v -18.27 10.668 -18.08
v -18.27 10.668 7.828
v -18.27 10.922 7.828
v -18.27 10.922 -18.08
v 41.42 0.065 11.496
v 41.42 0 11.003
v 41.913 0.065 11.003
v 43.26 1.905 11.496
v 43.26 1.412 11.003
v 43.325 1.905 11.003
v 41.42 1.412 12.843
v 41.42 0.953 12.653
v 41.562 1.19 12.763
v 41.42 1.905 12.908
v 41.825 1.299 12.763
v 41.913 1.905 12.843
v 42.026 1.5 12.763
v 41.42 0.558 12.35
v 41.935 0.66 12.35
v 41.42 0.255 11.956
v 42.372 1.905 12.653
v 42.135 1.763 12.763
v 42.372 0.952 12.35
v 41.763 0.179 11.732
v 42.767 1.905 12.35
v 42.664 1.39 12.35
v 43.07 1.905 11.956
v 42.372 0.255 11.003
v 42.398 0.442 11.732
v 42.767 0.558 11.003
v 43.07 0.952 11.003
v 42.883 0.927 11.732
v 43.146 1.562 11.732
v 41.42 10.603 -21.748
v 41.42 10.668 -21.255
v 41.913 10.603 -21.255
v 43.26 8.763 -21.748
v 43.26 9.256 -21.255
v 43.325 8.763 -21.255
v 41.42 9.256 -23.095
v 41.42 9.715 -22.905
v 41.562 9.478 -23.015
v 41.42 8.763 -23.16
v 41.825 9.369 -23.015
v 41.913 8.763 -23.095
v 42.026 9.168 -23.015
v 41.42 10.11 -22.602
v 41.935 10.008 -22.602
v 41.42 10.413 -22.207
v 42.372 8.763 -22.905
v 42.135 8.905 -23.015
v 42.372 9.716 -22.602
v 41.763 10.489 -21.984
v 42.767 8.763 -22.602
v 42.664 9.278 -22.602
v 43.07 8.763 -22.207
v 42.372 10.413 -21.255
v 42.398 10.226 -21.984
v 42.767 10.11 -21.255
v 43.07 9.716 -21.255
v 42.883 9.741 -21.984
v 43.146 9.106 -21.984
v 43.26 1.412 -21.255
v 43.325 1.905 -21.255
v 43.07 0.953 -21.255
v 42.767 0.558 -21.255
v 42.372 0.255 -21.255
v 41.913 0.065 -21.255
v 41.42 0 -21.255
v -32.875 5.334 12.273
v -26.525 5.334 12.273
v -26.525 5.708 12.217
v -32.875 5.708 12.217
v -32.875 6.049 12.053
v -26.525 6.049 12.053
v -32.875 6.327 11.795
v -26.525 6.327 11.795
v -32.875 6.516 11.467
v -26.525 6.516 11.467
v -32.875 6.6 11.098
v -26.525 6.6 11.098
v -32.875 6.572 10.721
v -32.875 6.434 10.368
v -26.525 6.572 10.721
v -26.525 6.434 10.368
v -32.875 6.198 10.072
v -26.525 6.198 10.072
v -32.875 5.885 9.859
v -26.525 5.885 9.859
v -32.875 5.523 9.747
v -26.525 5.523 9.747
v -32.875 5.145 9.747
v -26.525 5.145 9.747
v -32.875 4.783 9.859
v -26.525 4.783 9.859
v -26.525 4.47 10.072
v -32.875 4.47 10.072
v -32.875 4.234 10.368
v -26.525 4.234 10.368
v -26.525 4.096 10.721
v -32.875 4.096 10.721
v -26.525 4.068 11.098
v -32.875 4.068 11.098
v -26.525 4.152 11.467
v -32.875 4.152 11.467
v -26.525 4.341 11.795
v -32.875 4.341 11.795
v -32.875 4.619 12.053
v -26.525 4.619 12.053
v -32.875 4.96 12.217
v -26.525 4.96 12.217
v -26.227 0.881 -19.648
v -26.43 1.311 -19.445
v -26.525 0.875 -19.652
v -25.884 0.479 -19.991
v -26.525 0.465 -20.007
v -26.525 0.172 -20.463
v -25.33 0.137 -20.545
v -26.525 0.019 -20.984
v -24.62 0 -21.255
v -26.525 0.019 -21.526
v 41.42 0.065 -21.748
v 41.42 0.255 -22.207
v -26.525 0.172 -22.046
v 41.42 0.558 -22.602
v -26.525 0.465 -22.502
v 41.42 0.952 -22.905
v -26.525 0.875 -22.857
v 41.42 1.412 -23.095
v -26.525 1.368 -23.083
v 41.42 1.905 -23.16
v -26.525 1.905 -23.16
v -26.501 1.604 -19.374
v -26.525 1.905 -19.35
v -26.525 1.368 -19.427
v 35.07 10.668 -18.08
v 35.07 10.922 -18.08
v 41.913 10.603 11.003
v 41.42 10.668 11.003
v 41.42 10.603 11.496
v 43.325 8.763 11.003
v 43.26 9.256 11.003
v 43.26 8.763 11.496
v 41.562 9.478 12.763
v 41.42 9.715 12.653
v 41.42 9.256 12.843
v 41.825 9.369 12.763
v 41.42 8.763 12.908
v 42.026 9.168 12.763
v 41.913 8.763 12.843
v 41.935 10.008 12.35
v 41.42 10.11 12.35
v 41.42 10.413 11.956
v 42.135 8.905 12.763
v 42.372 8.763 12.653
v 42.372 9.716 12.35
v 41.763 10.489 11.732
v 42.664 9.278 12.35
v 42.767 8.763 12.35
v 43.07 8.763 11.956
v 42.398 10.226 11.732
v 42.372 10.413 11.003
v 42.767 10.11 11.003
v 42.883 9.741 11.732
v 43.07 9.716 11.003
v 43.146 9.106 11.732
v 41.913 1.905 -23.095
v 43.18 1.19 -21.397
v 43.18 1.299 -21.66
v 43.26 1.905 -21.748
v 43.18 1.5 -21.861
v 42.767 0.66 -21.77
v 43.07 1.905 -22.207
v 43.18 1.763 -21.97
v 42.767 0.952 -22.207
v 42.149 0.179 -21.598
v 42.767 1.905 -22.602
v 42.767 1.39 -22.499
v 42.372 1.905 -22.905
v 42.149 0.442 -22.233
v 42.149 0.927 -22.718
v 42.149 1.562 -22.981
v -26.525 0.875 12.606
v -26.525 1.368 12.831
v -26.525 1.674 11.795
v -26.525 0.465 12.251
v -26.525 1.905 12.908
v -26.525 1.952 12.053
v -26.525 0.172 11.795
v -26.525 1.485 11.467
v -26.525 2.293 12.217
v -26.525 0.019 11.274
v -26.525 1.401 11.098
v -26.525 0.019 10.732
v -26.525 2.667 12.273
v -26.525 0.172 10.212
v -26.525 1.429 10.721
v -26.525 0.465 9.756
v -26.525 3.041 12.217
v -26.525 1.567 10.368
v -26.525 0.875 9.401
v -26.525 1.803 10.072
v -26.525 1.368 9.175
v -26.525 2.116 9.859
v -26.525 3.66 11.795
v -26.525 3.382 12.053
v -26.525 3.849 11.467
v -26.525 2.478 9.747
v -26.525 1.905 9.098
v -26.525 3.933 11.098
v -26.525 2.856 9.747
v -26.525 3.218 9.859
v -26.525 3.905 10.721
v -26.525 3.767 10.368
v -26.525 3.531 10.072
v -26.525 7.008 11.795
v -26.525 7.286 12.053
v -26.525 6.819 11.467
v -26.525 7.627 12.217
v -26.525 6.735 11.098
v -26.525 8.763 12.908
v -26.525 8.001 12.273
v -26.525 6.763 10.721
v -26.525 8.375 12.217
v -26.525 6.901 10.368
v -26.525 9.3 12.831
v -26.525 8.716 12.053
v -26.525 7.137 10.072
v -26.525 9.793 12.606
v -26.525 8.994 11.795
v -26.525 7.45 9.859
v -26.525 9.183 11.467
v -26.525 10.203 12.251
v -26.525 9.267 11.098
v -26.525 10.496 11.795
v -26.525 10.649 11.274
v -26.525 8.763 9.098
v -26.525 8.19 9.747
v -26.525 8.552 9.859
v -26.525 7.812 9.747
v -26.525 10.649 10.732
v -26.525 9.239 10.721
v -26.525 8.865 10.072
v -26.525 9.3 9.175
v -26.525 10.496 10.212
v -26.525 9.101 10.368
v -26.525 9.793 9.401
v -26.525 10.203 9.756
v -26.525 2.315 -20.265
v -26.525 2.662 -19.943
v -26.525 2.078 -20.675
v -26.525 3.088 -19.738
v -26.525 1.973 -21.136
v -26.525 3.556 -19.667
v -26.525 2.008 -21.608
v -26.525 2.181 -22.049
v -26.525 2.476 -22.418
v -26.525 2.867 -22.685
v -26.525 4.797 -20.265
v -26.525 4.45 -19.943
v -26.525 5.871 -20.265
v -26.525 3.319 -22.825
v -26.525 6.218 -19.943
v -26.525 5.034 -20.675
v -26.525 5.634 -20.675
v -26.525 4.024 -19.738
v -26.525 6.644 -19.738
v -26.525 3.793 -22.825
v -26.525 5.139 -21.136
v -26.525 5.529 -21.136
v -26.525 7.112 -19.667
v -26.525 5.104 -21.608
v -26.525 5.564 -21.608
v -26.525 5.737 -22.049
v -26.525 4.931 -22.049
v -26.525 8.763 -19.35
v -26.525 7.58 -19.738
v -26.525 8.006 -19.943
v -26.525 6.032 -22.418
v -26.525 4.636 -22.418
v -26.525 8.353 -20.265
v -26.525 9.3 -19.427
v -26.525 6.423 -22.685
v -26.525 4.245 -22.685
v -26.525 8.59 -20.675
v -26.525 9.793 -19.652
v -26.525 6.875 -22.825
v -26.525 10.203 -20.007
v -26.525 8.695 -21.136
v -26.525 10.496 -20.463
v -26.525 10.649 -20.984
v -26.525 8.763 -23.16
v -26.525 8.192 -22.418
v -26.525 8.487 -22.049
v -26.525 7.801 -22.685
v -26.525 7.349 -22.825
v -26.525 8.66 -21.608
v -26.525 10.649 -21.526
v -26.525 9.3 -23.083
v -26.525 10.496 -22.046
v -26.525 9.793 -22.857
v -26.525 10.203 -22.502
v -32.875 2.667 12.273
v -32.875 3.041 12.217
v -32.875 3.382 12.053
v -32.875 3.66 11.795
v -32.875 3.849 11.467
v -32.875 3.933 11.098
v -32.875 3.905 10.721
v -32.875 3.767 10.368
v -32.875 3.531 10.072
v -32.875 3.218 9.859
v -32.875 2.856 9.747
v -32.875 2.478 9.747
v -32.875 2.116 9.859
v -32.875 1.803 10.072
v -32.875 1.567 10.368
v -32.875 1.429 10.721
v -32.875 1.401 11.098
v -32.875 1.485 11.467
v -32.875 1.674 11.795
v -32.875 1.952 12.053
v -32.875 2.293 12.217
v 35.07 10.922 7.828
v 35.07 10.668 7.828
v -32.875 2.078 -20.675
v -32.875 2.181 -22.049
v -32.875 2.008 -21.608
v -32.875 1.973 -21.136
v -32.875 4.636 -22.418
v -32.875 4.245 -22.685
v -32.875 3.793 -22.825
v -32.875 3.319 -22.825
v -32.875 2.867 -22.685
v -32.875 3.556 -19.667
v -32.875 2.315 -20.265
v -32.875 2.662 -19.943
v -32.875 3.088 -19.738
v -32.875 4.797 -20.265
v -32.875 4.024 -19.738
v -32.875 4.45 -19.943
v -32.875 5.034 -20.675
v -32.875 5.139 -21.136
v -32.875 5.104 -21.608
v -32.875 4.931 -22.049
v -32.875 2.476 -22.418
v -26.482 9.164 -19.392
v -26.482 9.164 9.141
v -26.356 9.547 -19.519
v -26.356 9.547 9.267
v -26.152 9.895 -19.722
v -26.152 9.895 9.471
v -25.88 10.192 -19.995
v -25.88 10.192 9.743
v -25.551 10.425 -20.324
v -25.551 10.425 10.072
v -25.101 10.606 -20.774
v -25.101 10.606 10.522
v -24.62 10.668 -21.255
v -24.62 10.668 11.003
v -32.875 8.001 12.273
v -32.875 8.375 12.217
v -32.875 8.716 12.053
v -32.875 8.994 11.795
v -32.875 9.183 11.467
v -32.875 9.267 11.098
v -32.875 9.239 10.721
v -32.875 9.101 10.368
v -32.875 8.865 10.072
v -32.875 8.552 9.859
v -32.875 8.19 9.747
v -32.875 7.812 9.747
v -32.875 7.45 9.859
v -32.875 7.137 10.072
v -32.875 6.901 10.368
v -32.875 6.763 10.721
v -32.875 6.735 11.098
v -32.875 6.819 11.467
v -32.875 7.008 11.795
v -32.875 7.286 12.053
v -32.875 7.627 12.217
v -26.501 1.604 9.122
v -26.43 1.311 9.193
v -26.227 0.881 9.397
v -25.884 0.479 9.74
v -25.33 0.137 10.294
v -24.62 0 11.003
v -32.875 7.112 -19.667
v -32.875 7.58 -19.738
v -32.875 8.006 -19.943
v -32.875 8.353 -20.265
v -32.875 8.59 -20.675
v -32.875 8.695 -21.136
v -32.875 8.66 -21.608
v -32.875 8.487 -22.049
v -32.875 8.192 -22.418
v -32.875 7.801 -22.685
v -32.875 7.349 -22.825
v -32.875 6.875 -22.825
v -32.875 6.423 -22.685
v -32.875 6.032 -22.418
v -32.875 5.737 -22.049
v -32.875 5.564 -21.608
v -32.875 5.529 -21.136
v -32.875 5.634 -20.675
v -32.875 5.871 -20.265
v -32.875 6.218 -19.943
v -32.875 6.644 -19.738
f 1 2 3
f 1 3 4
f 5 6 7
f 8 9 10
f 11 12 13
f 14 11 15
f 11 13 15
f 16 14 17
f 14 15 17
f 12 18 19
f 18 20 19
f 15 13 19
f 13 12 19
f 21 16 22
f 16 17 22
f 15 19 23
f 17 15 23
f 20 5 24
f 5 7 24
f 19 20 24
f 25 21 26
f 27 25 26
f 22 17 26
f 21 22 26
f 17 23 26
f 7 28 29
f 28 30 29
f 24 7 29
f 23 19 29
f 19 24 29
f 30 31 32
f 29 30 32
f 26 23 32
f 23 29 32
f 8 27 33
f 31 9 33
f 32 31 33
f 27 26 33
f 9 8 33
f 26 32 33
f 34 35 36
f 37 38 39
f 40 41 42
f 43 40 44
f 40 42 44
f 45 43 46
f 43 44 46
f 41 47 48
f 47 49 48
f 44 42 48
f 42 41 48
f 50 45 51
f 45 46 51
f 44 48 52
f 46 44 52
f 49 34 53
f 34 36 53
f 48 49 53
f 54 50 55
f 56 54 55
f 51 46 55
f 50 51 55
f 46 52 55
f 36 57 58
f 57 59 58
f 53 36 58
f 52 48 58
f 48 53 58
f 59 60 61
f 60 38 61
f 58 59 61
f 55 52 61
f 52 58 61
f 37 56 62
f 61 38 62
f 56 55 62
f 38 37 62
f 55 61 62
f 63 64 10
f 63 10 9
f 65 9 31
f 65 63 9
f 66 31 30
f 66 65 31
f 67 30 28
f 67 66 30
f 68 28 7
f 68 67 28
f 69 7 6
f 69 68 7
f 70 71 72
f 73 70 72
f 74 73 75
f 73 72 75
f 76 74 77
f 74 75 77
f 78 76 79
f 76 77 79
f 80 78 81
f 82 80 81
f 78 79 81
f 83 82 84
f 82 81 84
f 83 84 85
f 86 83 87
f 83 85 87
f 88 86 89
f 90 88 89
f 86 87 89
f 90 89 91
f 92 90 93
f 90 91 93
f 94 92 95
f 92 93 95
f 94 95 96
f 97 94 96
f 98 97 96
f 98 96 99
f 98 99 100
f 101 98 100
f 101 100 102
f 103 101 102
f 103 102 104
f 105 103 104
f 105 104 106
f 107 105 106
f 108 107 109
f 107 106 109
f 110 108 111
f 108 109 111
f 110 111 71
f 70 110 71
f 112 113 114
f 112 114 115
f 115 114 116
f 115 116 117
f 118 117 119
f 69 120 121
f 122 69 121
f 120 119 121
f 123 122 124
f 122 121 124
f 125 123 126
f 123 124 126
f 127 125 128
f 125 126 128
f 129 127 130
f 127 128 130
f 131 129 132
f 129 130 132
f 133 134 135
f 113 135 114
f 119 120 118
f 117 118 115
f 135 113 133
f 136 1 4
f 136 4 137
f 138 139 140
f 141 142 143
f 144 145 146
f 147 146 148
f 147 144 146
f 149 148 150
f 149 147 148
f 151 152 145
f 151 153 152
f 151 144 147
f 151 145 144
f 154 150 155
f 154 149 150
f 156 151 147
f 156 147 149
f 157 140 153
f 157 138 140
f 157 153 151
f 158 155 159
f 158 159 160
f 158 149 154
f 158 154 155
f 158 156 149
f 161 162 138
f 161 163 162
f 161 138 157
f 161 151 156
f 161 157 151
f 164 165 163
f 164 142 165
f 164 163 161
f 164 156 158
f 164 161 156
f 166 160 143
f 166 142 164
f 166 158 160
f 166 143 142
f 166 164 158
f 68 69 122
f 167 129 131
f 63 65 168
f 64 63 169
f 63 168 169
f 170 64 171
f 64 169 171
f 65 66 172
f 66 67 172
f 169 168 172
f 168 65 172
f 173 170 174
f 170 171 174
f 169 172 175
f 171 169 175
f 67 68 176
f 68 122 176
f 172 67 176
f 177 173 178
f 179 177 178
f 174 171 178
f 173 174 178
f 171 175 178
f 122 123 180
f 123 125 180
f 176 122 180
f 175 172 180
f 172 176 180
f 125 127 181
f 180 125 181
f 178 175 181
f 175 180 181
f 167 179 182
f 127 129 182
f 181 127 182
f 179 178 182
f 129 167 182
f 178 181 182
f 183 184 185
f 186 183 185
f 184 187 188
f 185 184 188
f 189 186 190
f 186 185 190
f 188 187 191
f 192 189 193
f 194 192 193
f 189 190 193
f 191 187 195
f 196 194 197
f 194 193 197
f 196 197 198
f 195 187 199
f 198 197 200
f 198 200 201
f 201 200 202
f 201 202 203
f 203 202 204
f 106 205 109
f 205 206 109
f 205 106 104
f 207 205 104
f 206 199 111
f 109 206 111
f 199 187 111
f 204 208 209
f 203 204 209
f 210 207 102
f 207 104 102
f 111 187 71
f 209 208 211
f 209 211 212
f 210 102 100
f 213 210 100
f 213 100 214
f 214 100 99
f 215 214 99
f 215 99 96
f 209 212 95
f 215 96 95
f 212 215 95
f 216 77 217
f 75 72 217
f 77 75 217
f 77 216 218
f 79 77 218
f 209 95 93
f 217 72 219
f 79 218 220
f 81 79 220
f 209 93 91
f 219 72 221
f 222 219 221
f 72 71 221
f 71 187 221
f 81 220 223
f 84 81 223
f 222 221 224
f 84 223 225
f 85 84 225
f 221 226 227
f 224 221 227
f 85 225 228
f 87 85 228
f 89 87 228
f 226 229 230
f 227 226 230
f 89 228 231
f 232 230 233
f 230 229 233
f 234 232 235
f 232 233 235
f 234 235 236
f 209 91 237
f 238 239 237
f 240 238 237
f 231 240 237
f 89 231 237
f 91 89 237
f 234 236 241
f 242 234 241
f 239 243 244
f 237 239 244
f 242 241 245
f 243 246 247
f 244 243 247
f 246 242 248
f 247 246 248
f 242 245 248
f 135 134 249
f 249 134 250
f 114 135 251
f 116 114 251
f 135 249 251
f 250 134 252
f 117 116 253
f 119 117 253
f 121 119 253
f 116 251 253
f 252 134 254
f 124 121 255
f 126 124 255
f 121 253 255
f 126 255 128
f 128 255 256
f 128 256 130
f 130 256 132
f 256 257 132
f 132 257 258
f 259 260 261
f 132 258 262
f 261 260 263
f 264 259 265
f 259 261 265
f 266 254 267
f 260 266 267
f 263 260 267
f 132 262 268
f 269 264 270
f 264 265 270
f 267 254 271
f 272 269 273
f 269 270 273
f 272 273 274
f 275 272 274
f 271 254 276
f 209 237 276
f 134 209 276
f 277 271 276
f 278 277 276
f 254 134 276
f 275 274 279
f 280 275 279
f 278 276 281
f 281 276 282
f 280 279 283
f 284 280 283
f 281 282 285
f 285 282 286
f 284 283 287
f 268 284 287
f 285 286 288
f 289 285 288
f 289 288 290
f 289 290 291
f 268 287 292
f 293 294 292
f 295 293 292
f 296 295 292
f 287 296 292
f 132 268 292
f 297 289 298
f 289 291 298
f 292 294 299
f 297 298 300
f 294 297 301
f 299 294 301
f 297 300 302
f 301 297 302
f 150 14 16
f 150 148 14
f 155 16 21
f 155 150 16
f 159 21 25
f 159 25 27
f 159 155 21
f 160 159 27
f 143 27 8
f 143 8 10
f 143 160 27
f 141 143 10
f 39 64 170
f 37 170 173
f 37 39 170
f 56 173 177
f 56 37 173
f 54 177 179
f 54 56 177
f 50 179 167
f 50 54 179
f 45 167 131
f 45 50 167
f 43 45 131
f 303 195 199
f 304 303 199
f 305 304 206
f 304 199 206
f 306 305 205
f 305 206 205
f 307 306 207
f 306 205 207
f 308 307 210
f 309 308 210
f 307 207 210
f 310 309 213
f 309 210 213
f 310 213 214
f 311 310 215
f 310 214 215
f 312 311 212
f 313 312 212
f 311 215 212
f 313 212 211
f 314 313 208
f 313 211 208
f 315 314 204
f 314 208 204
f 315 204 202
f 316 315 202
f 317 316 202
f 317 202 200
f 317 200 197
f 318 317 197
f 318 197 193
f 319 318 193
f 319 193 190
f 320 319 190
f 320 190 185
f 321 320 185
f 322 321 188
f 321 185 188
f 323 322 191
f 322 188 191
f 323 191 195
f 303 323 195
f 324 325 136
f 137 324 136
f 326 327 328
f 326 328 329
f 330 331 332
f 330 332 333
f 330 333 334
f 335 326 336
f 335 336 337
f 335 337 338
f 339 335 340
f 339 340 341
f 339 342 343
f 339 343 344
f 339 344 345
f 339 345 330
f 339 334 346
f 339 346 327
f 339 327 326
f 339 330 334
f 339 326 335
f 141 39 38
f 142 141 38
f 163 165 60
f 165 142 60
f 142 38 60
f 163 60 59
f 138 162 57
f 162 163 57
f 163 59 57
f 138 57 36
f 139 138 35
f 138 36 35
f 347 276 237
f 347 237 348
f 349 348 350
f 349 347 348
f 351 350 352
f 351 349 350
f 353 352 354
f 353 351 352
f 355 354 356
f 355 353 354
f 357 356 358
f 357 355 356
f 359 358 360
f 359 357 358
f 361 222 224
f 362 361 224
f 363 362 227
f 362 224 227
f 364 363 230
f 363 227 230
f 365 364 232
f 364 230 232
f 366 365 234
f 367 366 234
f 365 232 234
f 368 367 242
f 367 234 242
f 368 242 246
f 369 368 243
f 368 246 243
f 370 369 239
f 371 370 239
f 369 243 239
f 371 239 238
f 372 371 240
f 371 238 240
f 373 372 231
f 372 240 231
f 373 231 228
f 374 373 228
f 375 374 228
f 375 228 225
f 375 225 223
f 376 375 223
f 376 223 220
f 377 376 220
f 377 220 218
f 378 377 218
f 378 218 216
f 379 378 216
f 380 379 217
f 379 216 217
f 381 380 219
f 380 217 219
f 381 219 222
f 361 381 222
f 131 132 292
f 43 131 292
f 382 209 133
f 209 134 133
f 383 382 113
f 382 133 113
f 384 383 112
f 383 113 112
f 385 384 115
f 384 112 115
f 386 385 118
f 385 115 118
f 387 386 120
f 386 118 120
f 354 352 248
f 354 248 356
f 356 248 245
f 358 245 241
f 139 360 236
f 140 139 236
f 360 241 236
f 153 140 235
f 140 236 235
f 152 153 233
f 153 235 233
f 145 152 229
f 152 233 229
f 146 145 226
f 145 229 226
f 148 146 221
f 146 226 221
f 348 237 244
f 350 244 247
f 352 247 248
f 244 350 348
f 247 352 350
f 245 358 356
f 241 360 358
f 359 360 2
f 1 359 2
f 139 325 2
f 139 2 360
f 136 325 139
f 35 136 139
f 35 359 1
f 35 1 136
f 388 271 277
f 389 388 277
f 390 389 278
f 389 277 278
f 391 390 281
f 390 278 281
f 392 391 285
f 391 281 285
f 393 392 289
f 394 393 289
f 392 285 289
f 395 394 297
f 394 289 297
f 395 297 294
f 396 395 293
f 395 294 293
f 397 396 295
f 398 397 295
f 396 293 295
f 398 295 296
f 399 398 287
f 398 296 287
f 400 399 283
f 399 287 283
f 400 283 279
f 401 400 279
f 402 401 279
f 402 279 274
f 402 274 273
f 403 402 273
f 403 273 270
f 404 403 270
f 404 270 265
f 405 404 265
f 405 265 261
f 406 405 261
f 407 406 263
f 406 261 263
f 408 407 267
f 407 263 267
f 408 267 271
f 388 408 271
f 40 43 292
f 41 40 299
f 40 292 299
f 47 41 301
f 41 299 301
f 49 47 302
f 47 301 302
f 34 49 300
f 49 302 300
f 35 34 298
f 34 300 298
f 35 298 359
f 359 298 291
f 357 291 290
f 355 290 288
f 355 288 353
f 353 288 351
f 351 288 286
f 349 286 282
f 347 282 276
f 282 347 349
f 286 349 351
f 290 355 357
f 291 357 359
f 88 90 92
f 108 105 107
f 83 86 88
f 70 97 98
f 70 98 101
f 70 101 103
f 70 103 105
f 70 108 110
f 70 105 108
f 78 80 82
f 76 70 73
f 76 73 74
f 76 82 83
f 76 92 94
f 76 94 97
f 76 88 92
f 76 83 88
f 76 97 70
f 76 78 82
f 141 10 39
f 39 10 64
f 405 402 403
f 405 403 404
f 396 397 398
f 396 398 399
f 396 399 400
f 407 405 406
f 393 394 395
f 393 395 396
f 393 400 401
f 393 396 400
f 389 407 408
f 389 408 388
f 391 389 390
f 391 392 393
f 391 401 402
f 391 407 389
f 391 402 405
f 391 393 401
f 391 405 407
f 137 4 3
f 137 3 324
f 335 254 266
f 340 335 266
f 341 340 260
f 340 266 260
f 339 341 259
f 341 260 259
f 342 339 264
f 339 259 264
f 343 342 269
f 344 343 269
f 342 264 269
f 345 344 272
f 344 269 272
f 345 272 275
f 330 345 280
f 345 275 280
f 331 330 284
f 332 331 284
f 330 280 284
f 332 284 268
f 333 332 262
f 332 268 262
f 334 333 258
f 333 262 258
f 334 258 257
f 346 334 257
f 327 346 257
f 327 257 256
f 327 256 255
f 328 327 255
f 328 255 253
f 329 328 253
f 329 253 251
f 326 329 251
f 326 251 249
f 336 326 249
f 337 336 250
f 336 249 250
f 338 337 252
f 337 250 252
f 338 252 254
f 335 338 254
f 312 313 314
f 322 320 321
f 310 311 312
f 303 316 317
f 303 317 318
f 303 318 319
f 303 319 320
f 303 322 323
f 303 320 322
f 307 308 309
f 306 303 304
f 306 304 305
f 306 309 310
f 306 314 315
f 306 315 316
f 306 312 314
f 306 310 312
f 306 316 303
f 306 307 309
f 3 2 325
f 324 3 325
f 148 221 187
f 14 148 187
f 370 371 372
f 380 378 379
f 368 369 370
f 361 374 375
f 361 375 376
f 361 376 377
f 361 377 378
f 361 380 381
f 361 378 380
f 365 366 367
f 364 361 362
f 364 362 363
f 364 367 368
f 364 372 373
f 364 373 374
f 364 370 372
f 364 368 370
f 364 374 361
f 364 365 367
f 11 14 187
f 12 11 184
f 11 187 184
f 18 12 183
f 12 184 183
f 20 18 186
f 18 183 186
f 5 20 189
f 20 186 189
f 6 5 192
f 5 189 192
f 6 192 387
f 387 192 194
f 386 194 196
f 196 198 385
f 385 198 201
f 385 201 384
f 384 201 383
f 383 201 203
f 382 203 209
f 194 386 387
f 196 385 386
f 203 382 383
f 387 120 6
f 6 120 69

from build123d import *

# Parameters (mm, degrees)
SKETCH1_W       = 69.85
SKETCH1_H       = 36.068
BATTERY_DEPTH   = 10.668
FILLET_2_R      = 1.905
WIRE_BOSS_DEPTH = 5.08
SKETCH3_R       = 1.27
SKETCH3_R_2     = 1.5875
WIRES_2_DEPTH   = 6.35
SKETCH4_W       = 53.34
SKETCH4_H       = 25.908
LABEL_DEPTH     = 0.254


with BuildPart() as part:
    # Sketch1 → Battery (new body)
    with BuildSketch(Plane(origin=(0, 0, 0), x_dir=(1, 0, 0), z_dir=(0, 1, 0))):
        with Locations((8.399917755, 5.125761329)):
            Rectangle(SKETCH1_W, SKETCH1_H)
    extrude(amount=BATTERY_DEPTH)

    # Fillet 2
    fillet_2_edges = [part.edges().sort_by_distance(p)[0] for p in [
        (43.324917755, 10.668, -5.125761329),
        (8.399917755, 10.668, -23.159761329),
        (-26.525082245, 10.668, -5.125761329),
        (8.399917755, 0, -23.159761329),
        (43.324917755, 0, -5.125761329),
        (8.399917755, 0, 12.908238671),
        (-26.525082245, 0, -5.125761329),
        (8.399917755, 10.668, 12.908238671),
        (-26.525082245, 5.334, -23.159761329),
        (43.324917755, 5.334, -23.159761329),
        (43.324917755, 5.334, 12.908238671),
        (-26.525082245, 5.334, 12.908238671),
    ]]
    fillet(fillet_2_edges, radius=FILLET_2_R)

    # Sketch2 → Wire Boss (add)
    with BuildSketch(Plane.ZY.offset(26.525082245)):
        with BuildLine():
            Line((12.908238671, 8.763), (12.908238671, 1.905))
            ThreePointArc((12.908238671, 1.905), (11.003238671, 0), (9.098238671, 1.905))
            Line((9.098238671, 1.905), (9.098238671, 8.763))
            ThreePointArc((9.098238671, 8.763), (11.003238671, 10.668), (12.908238671, 8.763))
        make_face()
        with BuildLine():
            Line((-19.349761329, 8.763), (-19.349761329, 1.905))
            ThreePointArc((-19.349761329, 1.905), (-21.254761329, 0), (-23.159761329, 1.905))
            Line((-23.159761329, 1.905), (-23.159761329, 8.763))
            ThreePointArc((-23.159761329, 8.763), (-21.254761329, 10.668), (-19.349761329, 8.763))
        make_face()
    extrude(amount=-WIRE_BOSS_DEPTH)

    # Sketch3 → Wires 2 (add)
    with BuildSketch(Plane.ZY.offset(26.525082245)):
        with Locations((11.003238671, 8.001)):
            Circle(SKETCH3_R)
        with Locations((11.003238671, 5.334)):
            Circle(SKETCH3_R)
        with Locations((11.003238671, 2.667)):
            Circle(SKETCH3_R)
        with Locations((-21.254761329, 7.112)):
            Circle(SKETCH3_R_2)
        with Locations((-21.254761329, 3.556)):
            Circle(SKETCH3_R_2)
    extrude(amount=WIRES_2_DEPTH)

    # Sketch4 → Label (add)
    with BuildSketch(Plane(origin=(0, 10.668, 0), x_dir=(1, 0, 0), z_dir=(0, 1, 0))):
        with Locations((8.399917755, 5.125761329)):
            Rectangle(SKETCH4_W, SKETCH4_H)
    extrude(amount=LABEL_DEPTH)


solid = part.part
